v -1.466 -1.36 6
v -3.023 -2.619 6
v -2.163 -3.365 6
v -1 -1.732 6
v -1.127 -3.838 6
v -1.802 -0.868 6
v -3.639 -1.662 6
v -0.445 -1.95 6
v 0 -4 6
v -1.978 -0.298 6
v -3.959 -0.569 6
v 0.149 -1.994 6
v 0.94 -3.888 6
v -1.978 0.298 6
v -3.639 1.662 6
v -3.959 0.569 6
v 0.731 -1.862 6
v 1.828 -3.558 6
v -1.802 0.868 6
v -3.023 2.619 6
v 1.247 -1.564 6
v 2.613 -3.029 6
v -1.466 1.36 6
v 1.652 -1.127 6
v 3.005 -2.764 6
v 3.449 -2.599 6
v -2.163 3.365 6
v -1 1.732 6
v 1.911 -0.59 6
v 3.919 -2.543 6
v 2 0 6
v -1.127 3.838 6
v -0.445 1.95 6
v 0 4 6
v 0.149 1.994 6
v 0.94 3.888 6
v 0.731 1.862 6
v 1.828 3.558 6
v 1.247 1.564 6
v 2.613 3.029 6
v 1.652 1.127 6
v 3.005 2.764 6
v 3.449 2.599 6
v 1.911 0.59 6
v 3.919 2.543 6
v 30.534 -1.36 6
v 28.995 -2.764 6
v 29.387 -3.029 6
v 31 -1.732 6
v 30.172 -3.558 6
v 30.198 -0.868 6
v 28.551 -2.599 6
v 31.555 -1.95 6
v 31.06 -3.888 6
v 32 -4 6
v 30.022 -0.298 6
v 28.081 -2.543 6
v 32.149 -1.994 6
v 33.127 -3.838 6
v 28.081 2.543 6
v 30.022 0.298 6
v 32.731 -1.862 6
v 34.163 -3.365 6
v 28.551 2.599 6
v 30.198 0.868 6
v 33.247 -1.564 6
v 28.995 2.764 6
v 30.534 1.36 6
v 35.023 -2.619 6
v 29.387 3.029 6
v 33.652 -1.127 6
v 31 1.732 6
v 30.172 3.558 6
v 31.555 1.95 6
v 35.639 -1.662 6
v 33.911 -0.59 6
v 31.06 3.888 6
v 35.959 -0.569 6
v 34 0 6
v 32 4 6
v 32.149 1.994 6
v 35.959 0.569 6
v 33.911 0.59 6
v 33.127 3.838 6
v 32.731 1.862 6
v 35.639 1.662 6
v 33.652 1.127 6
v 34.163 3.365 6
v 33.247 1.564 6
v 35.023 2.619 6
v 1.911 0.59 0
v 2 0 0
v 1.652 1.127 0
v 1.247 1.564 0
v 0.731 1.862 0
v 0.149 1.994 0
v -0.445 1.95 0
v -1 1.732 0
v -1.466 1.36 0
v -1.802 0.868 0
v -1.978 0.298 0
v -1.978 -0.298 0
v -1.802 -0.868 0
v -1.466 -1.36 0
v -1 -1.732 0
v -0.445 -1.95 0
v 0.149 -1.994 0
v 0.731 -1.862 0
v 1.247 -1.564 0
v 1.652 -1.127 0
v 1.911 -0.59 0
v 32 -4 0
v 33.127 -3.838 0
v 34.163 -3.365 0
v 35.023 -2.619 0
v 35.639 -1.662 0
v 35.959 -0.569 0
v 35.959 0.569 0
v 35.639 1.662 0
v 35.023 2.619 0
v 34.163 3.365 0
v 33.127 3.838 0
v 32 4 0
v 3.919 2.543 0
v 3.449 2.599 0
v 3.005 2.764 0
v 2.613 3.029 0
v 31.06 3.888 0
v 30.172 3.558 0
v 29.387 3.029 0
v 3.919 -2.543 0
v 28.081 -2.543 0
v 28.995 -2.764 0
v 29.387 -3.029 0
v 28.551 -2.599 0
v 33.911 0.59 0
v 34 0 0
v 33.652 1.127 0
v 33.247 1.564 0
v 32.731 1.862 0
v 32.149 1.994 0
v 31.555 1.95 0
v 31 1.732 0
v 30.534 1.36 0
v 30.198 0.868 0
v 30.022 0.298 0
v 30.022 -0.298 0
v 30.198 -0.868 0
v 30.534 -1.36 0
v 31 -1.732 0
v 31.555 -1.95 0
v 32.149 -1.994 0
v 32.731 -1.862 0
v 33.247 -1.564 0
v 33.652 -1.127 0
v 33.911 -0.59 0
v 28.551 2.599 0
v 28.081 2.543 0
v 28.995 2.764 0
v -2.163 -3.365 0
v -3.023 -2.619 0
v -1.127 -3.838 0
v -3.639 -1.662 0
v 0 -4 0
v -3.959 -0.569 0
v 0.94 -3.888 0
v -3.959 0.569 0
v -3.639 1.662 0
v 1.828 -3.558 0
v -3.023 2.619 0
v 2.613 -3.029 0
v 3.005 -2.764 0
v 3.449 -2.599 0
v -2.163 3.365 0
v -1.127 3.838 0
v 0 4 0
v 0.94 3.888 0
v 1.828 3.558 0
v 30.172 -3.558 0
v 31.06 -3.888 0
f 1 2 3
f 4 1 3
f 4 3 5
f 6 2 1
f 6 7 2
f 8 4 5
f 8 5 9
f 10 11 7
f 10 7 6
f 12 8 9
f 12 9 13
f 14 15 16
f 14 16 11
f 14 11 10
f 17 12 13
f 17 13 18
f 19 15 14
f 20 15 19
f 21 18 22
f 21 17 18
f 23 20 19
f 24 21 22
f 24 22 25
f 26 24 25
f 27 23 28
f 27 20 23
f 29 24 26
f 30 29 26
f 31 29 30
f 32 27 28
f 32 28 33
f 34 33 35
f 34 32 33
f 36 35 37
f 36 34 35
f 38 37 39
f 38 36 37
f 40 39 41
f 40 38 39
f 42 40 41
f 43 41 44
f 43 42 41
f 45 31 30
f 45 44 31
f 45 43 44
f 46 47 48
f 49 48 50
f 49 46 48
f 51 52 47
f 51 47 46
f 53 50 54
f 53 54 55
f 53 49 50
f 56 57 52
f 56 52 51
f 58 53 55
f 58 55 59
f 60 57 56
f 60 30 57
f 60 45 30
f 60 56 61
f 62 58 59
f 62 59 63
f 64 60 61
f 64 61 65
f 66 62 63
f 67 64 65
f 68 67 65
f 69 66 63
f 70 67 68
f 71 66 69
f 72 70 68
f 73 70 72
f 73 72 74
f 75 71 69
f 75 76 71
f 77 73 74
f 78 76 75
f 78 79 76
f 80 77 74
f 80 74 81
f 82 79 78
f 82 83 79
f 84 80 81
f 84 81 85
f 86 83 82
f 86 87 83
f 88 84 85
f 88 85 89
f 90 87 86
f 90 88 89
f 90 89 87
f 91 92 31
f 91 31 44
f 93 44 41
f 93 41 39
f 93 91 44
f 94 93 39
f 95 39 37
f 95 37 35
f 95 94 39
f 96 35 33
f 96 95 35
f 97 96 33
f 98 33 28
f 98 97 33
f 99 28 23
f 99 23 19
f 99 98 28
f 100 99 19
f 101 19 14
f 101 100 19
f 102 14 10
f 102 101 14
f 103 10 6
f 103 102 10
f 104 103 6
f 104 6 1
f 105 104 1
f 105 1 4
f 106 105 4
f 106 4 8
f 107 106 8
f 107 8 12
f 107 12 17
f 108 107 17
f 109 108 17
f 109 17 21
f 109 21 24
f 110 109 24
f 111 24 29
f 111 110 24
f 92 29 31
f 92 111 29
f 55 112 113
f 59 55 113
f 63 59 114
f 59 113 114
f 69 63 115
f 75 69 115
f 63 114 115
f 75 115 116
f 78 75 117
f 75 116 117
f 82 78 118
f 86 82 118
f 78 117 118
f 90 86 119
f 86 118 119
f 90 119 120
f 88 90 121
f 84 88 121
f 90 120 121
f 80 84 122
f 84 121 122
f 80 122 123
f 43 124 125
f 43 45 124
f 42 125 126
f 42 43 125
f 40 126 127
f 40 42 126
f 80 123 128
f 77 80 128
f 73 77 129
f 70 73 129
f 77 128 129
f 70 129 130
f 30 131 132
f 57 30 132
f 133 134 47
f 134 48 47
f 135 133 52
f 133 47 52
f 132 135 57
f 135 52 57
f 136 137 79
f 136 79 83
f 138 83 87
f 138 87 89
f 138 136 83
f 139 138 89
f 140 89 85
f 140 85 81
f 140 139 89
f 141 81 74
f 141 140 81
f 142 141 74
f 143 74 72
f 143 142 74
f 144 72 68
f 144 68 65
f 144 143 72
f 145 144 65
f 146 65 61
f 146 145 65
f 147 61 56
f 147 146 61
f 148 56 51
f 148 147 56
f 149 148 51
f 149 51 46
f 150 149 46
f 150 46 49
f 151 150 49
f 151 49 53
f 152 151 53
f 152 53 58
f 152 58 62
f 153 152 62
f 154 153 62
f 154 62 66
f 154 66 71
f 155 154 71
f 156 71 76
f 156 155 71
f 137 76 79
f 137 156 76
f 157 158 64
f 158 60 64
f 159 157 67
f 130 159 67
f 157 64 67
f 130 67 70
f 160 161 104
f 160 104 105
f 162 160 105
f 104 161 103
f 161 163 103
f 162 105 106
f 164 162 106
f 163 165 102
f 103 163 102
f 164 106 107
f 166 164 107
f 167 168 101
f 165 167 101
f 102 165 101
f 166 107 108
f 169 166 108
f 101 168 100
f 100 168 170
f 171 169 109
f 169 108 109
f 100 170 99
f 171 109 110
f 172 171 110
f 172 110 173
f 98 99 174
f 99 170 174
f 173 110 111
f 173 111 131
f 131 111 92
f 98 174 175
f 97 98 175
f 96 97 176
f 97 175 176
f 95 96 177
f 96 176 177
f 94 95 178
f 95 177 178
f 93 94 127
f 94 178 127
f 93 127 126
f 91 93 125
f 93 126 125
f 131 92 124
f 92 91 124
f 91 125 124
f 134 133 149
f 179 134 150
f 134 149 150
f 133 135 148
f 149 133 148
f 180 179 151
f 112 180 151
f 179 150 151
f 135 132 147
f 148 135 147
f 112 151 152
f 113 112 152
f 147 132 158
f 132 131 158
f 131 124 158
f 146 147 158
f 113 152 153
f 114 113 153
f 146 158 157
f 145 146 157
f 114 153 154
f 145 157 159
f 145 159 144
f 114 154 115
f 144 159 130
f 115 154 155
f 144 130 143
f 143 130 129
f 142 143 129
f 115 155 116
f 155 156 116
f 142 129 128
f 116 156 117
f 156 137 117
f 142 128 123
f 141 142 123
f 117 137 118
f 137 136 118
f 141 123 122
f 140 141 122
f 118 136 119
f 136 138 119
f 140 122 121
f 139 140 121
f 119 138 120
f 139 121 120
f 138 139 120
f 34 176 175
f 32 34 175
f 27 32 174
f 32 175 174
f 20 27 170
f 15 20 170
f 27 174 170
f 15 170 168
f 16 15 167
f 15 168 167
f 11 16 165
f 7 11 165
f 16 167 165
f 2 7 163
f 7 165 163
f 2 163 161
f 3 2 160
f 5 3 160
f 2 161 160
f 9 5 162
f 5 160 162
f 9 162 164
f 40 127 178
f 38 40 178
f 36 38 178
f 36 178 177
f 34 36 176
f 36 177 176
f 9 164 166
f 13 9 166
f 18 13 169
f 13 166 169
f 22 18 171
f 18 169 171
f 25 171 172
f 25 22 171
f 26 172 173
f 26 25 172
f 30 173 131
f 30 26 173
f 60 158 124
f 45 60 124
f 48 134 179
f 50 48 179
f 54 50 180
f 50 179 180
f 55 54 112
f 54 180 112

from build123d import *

# Parameters (mm, degrees)
SKETCH1_R           = 2
BOSS_EXTRUDE1_DEPTH = 6
FILLET1_R           = 2


with BuildPart() as part:
    # Sketch1 → Boss-Extrude1 (new body)
    with BuildSketch(Plane.XY):
        with BuildLine():
            Line((28.912721374, 2.543366015), (3.087278626, 2.543366015))
            ThreePointArc((3.087278626, 2.543366015), (1.706829801, 3.617558849), (0, 4))
            ThreePointArc((0, 4), (-4, 0), (0, -4))
            ThreePointArc((0, -4), (1.706829801, -3.617558849), (3.087278626, -2.543366015))
            Line((3.087278626, -2.543366015), (28.912721374, -2.543366015))
            ThreePointArc((28.912721374, -2.543366015), (30.293170199, -3.617558849), (32, -4))
            ThreePointArc((32, -4), (36, 0), (32, 4))
            ThreePointArc((32, 4), (30.293170199, 3.617558849), (28.912721374, 2.543366015))
        make_face()
        Circle(SKETCH1_R, mode=Mode.SUBTRACT)
        with Locations((32, 0)):
            Circle(SKETCH1_R, mode=Mode.SUBTRACT)
    extrude(amount=BOSS_EXTRUDE1_DEPTH)

    # Fillet1
    fillet1_edges = [part.edges().sort_by_distance(p)[0] for p in [
        (28.912721374, 2.543366015, 3),
        (28.912721374, -2.543366015, 3),
        (3.087278626, -2.543366015, 3),
        (3.087278626, 2.543366015, 3),
    ]]
    fillet(fillet1_edges, radius=FILLET1_R)


solid = part.part
